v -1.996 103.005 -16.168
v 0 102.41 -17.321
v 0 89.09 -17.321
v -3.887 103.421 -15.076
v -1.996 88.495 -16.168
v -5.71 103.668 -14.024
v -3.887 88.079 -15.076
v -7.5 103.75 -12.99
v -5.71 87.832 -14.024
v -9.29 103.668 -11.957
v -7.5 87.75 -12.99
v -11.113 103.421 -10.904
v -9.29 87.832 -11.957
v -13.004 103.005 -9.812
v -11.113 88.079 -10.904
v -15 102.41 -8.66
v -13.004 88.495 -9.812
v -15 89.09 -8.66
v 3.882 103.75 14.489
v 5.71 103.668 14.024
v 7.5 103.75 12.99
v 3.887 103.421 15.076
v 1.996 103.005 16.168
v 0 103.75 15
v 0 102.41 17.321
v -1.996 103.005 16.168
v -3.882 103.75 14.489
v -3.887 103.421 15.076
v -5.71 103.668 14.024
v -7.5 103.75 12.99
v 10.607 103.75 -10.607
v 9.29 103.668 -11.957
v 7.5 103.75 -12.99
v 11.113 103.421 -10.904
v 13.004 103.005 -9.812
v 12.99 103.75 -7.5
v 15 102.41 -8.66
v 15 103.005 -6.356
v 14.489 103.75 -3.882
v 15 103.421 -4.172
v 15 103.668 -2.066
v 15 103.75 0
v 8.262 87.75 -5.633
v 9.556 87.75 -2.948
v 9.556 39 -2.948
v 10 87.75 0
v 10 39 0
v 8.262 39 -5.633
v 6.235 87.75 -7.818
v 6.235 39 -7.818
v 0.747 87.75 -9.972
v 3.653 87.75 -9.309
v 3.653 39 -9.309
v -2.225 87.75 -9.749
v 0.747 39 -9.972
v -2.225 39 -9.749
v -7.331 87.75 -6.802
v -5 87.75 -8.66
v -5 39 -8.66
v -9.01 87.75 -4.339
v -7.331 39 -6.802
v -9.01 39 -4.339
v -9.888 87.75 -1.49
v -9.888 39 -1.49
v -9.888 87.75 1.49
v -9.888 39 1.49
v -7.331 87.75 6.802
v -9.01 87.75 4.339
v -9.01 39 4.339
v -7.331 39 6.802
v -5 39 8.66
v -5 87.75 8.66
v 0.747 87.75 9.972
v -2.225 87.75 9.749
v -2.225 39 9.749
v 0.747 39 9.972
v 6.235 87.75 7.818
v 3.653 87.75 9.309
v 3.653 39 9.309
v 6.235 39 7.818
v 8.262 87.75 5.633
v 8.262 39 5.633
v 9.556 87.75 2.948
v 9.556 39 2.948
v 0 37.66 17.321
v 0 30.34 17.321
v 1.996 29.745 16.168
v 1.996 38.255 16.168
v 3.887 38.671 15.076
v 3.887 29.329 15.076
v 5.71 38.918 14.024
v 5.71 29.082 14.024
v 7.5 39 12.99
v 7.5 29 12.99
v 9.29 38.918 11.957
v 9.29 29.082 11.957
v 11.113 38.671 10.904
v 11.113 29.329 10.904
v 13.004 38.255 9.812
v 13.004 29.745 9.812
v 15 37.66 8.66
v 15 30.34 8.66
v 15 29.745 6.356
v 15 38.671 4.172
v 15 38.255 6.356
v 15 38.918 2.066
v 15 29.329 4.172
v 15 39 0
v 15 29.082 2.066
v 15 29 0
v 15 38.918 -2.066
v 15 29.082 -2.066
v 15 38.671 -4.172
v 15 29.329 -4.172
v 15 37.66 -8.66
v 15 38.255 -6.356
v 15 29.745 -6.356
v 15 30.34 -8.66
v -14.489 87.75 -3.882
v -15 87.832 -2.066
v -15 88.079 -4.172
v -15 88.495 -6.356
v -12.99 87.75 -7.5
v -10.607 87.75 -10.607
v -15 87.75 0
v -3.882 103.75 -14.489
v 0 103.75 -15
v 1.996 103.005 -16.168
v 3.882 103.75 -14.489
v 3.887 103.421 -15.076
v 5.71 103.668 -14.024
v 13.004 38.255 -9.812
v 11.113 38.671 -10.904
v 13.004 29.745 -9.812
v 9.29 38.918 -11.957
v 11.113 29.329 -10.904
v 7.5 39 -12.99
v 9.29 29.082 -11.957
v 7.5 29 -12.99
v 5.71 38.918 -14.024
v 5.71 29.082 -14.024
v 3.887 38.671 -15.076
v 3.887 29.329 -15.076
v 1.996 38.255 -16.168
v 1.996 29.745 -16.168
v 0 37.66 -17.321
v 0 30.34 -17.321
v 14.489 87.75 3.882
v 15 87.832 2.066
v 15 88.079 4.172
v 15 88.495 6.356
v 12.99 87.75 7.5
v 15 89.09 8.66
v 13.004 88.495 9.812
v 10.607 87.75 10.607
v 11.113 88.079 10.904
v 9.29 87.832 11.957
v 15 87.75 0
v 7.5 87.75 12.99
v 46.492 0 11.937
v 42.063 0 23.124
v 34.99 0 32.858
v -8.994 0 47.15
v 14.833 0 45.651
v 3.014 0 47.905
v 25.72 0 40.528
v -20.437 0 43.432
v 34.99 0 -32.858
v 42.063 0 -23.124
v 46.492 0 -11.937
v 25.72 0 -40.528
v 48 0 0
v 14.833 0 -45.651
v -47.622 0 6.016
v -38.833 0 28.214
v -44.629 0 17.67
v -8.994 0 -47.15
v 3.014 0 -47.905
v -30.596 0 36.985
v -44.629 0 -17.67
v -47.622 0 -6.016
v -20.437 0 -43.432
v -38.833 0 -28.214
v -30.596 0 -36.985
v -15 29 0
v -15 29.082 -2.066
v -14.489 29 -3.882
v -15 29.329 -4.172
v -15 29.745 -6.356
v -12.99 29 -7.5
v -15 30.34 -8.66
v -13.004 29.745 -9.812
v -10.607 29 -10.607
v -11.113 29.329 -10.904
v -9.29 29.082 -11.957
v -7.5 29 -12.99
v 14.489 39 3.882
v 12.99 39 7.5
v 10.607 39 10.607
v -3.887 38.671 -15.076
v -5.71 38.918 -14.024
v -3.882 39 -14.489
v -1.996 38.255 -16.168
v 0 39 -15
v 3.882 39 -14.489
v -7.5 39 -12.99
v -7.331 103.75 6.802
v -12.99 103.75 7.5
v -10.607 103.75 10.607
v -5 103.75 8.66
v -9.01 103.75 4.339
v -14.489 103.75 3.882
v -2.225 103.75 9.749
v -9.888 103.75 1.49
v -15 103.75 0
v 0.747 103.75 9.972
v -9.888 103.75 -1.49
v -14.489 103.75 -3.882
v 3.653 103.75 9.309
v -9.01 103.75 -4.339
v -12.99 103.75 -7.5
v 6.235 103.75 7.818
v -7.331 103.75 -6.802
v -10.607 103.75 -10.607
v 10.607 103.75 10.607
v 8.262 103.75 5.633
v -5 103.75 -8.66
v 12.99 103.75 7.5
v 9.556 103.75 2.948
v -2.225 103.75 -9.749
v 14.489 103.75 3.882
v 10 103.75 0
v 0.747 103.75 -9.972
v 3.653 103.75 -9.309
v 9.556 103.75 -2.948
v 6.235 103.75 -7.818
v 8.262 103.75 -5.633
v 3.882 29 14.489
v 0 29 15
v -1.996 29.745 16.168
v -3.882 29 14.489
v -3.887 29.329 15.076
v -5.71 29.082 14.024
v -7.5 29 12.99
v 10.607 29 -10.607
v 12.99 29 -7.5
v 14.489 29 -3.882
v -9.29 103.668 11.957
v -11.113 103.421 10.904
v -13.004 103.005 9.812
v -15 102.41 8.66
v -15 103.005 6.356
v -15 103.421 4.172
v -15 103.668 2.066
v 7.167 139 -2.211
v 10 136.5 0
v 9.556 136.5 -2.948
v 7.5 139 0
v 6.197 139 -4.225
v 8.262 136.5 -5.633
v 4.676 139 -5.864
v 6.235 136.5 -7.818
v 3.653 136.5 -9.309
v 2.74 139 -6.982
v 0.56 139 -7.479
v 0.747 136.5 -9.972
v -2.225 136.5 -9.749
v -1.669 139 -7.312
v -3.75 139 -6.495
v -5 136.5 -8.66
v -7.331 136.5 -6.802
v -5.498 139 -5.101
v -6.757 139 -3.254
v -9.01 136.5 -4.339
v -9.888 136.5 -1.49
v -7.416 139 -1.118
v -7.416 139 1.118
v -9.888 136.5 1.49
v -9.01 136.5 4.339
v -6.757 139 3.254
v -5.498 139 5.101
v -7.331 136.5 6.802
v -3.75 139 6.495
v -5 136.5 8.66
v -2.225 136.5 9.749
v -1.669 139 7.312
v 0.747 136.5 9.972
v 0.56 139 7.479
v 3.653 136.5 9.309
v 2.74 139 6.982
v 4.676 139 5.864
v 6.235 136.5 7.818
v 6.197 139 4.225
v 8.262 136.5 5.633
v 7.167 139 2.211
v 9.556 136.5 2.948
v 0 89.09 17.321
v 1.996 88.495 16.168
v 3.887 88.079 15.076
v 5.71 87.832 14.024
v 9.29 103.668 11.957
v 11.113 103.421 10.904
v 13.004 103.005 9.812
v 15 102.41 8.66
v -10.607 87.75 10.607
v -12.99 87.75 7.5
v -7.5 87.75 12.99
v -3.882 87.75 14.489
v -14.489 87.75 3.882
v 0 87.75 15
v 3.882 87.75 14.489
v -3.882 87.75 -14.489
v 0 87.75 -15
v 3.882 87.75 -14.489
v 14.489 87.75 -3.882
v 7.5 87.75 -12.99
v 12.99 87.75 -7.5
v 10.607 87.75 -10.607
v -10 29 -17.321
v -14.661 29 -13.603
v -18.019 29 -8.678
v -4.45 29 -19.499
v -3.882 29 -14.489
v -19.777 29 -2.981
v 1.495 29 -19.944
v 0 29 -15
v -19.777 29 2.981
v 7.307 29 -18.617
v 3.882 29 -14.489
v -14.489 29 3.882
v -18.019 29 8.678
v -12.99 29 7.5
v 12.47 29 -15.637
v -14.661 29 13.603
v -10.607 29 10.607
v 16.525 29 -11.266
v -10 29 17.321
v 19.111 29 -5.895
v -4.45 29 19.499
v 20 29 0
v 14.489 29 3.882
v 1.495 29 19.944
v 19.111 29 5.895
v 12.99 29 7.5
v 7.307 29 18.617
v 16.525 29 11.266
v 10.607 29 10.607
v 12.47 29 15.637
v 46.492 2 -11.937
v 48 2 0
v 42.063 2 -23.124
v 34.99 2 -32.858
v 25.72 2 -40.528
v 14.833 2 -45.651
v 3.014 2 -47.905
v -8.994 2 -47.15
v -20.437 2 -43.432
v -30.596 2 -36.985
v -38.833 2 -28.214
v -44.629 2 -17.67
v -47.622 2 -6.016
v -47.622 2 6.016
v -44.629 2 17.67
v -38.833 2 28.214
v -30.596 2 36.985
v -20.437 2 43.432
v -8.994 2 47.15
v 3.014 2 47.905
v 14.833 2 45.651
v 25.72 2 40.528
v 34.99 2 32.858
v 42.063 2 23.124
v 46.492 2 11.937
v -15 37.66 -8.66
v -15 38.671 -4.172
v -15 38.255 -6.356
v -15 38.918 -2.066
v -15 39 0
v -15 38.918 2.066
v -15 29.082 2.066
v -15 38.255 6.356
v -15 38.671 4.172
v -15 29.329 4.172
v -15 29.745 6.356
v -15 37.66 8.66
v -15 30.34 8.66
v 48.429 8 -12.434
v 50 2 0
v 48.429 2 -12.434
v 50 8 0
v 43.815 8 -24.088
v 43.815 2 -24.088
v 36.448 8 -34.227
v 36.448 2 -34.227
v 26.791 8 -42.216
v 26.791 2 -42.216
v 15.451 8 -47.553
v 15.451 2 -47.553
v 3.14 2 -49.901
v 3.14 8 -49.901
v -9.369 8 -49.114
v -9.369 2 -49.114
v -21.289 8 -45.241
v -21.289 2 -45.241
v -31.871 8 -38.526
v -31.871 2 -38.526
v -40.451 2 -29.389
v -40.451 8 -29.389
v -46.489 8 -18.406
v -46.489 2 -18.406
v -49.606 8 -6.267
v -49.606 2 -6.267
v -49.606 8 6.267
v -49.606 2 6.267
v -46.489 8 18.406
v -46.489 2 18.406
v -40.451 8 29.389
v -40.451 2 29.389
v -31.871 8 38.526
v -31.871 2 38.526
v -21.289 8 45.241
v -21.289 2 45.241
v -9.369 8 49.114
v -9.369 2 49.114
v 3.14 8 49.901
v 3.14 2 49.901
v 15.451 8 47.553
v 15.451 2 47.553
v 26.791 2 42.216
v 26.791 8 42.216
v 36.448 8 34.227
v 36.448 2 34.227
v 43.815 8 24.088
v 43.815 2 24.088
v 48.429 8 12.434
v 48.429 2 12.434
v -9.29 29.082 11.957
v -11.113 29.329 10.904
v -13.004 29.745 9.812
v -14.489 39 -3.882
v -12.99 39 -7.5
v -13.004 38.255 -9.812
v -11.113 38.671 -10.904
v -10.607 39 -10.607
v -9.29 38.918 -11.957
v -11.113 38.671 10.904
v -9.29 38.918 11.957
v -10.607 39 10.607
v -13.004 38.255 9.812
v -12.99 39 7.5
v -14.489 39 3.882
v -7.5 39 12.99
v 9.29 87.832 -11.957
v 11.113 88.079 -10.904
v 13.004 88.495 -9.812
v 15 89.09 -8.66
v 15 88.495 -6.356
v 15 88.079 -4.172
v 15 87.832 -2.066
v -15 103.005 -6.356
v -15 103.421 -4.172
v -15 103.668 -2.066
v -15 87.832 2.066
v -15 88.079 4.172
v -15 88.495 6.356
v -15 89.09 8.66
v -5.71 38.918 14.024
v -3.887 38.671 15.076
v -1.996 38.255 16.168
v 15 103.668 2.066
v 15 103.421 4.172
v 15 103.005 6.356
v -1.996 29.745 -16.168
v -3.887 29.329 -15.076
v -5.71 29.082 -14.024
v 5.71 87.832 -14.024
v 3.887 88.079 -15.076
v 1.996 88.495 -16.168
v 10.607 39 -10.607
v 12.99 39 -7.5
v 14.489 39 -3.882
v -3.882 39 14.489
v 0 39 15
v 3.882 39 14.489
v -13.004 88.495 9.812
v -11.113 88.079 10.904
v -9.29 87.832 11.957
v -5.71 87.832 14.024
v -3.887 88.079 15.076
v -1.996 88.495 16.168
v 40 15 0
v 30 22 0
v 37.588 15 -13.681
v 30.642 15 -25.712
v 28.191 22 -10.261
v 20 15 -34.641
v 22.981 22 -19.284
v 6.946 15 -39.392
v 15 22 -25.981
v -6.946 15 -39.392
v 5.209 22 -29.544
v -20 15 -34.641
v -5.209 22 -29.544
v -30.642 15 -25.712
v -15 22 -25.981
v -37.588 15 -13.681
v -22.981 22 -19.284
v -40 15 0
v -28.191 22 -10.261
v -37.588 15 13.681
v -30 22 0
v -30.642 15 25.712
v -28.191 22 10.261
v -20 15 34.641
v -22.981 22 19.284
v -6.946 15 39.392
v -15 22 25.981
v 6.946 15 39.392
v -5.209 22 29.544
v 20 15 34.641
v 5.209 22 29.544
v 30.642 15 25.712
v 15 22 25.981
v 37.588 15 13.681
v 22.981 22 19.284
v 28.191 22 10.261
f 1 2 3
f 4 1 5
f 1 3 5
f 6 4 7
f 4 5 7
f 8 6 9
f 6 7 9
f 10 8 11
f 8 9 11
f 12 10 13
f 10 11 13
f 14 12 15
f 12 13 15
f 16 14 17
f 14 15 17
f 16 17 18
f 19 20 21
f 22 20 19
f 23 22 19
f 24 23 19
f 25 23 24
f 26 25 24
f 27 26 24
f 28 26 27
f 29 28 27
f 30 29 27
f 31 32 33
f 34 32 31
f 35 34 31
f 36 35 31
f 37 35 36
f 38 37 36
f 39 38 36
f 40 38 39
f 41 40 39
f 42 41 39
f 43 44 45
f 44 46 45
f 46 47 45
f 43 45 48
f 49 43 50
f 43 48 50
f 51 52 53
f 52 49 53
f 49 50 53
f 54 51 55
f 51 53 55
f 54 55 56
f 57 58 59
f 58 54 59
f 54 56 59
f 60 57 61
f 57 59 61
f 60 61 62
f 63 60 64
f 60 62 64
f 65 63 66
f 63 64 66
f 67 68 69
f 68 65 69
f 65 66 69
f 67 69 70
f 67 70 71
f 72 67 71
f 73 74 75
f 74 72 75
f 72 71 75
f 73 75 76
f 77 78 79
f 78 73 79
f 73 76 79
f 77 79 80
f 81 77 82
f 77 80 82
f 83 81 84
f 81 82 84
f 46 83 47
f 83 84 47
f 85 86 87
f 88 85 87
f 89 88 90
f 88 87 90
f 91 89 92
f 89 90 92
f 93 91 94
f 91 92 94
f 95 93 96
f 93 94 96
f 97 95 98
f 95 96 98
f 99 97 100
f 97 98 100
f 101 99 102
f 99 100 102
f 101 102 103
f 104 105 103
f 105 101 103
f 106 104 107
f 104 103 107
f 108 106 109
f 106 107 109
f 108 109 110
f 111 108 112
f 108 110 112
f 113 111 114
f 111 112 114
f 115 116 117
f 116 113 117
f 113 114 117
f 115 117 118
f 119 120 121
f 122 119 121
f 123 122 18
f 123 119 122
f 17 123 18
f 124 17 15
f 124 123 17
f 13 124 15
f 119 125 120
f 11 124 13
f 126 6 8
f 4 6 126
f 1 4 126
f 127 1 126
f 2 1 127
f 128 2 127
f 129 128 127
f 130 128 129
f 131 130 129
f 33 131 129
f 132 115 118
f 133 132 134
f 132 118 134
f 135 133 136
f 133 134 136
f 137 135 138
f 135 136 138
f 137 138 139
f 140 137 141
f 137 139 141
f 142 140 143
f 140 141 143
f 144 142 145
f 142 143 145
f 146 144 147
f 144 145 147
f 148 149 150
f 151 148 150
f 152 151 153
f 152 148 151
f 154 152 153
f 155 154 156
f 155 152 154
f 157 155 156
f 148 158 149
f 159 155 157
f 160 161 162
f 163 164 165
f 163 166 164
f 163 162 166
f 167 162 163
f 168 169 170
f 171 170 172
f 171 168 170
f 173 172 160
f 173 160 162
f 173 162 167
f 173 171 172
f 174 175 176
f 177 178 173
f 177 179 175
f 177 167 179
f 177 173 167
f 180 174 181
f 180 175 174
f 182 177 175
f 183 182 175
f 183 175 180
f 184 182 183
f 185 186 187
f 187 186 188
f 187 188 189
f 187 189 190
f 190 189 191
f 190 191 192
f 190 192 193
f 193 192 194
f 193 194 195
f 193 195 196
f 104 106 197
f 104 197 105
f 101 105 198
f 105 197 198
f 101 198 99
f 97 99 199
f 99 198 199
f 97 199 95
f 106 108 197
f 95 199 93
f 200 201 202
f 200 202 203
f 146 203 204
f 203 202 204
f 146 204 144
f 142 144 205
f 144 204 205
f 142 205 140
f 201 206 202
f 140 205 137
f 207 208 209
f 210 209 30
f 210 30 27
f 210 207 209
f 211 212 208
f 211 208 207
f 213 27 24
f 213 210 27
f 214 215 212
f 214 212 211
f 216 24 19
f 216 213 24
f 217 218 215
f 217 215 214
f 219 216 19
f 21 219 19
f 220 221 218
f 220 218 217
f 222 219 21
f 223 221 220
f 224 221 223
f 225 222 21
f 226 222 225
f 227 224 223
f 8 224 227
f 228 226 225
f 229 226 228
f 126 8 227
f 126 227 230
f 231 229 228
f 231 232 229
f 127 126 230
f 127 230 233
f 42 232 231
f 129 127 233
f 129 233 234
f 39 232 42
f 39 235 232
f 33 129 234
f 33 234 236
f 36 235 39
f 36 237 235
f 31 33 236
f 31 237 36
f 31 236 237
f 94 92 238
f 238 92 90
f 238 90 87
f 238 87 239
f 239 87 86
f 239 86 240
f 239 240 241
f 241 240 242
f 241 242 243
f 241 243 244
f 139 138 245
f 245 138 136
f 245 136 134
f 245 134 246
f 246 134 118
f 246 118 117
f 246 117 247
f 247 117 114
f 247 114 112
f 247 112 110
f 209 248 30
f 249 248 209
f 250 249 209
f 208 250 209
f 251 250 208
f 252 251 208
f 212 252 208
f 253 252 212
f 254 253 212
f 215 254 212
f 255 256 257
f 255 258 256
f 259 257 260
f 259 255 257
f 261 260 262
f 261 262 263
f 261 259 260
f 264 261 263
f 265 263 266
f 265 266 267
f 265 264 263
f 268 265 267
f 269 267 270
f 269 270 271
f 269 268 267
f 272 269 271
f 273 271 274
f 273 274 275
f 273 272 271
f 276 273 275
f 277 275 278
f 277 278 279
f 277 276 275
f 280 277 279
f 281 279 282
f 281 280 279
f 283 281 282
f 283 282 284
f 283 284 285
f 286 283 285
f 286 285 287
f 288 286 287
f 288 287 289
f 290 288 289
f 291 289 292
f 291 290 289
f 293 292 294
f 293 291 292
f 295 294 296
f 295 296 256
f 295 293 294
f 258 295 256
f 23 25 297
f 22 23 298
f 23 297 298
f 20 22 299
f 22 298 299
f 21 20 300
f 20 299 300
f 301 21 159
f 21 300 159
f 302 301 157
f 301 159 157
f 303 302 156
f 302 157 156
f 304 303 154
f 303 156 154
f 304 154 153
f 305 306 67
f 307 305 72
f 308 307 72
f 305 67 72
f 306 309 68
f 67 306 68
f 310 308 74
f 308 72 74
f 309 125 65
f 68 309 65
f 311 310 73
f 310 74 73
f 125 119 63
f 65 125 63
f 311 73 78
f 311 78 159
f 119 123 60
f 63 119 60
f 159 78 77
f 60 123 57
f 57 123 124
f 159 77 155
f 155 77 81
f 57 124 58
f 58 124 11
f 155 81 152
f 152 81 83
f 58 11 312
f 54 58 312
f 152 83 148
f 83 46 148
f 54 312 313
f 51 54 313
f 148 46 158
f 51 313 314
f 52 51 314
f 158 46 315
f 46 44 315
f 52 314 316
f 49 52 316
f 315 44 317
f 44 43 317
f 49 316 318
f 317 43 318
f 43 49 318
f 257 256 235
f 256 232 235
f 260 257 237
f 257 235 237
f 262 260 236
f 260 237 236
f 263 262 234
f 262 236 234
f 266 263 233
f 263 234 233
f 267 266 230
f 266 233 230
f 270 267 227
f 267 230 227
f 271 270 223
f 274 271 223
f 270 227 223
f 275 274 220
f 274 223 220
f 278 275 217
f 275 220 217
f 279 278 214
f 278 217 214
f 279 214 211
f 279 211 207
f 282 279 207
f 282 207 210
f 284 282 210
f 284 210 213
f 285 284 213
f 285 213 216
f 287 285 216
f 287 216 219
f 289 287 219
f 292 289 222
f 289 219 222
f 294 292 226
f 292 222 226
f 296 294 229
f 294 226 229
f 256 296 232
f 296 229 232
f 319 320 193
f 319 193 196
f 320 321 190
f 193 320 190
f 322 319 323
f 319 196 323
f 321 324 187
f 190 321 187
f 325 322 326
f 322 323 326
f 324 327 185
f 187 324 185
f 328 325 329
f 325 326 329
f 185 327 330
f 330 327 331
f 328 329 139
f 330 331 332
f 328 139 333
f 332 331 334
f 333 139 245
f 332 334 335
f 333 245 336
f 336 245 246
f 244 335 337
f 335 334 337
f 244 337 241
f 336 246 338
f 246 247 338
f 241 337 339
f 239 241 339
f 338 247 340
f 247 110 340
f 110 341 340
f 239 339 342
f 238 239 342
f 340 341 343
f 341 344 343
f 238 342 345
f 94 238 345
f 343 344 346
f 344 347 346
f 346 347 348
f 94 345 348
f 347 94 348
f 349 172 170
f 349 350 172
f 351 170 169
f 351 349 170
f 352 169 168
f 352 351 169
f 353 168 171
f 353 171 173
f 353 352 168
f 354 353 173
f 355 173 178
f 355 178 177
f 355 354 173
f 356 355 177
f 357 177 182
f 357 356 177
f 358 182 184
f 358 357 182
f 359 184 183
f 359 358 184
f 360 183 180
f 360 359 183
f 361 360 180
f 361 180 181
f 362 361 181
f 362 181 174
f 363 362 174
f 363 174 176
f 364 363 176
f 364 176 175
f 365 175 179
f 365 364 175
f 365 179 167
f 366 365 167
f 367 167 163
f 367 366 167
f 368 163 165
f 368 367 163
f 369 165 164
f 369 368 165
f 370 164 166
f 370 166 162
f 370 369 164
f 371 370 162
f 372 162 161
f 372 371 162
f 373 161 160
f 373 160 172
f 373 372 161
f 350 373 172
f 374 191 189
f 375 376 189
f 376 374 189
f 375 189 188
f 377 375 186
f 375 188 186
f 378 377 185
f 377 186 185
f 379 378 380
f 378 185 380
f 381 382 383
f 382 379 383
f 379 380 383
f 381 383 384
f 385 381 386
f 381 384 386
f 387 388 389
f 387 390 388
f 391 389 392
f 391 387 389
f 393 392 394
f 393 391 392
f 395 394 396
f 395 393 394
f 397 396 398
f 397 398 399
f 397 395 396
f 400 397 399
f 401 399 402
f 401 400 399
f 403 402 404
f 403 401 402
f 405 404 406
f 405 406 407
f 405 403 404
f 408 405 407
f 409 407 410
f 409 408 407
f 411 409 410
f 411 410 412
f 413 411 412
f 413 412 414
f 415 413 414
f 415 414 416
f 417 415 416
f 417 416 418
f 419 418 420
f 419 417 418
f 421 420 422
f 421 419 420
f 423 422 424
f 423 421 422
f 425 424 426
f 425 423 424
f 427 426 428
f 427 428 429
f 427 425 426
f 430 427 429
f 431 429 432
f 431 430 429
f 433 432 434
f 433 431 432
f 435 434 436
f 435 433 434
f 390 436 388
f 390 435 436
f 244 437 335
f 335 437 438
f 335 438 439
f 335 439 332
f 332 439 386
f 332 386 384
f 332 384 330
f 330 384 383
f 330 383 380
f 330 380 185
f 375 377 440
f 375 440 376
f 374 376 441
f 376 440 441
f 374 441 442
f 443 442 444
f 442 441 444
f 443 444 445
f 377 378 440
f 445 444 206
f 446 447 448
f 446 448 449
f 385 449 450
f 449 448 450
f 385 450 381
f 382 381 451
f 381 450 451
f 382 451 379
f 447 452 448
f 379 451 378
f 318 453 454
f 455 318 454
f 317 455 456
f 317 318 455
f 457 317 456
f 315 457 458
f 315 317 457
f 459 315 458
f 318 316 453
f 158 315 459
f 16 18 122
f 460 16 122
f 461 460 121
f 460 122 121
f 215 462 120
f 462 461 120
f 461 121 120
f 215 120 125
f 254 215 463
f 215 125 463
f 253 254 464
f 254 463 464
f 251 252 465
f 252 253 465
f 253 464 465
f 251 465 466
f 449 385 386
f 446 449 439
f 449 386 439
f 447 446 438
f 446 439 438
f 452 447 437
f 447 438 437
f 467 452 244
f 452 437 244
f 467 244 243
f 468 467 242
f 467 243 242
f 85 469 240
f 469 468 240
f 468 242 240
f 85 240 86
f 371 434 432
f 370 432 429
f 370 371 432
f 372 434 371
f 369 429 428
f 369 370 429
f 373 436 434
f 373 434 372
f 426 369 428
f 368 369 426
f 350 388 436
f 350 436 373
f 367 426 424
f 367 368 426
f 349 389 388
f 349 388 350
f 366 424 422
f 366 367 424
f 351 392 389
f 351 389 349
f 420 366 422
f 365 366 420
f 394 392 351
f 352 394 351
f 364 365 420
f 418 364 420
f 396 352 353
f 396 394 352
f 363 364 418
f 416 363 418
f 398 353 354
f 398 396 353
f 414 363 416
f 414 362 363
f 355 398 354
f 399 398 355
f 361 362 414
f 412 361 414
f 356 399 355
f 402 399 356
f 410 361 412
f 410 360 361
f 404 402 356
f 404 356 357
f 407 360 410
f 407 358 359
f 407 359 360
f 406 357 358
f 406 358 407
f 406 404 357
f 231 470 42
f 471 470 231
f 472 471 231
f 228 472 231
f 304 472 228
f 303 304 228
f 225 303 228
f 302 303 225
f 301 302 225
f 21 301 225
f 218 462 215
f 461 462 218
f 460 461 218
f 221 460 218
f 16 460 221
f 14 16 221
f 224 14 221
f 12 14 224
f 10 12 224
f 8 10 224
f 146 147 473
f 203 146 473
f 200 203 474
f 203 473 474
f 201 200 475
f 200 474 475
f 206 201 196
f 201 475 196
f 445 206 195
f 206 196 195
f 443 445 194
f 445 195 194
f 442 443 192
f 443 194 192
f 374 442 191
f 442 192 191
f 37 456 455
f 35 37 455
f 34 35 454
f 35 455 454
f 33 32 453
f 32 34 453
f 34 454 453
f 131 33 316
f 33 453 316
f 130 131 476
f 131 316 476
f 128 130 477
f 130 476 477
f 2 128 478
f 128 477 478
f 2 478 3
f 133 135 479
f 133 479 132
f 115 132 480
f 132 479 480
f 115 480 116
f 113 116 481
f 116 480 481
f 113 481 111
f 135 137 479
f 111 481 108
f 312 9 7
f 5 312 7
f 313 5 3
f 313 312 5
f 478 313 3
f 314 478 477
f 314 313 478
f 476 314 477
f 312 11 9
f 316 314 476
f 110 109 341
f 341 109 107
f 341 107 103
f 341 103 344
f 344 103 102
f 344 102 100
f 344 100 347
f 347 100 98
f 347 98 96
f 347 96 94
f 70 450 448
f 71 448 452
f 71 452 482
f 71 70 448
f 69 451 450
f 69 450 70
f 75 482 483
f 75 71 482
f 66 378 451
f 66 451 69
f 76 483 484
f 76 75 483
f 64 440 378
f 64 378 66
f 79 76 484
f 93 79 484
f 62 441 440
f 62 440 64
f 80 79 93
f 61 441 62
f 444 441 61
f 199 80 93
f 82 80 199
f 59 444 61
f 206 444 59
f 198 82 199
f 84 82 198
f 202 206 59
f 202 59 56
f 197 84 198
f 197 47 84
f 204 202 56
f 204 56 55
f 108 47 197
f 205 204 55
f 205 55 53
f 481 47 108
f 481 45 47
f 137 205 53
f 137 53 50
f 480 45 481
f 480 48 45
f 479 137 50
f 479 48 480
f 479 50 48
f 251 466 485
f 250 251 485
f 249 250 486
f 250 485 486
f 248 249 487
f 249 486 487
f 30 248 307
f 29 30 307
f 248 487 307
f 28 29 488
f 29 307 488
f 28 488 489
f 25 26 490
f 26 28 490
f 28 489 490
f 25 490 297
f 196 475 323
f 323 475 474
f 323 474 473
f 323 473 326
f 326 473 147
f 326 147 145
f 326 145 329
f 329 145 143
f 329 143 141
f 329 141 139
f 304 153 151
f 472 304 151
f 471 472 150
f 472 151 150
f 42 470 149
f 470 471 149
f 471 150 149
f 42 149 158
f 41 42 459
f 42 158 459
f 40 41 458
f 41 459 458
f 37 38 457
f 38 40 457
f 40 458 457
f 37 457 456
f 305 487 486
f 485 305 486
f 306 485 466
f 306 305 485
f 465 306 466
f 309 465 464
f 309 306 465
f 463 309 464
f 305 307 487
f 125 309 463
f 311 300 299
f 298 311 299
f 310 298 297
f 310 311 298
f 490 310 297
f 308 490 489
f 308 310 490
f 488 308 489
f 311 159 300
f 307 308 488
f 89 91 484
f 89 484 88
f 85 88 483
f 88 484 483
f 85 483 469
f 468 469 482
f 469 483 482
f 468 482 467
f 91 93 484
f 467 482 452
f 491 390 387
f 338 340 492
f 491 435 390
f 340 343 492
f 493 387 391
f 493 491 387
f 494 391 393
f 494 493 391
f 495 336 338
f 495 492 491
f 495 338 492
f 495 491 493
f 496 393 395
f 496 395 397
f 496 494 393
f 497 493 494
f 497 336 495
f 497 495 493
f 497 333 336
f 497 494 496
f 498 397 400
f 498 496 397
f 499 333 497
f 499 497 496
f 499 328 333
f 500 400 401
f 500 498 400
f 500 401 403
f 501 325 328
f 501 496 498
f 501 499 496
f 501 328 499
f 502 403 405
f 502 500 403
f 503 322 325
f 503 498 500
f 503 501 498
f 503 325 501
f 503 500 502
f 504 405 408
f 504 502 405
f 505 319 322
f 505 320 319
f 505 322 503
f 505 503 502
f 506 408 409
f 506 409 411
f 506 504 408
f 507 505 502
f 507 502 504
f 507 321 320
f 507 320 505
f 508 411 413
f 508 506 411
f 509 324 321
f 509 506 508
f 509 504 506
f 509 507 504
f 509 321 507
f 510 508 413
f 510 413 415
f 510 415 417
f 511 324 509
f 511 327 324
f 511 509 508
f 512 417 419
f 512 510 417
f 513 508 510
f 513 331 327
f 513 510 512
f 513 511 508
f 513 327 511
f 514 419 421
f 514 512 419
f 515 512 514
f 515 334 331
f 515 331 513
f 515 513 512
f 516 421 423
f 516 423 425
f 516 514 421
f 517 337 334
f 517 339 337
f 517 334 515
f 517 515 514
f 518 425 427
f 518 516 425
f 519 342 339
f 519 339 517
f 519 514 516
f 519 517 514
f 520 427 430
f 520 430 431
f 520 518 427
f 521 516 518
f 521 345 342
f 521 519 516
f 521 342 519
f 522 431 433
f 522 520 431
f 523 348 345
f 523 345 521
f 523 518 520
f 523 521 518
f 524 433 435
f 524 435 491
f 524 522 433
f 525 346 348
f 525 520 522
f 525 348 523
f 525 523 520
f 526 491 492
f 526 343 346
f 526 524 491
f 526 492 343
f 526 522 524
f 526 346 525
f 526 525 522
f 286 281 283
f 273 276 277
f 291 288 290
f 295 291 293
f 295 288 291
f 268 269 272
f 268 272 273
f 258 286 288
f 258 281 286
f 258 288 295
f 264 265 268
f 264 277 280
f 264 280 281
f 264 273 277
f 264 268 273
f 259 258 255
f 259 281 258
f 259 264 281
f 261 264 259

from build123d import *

# Parameters (mm, degrees)
EXTRUDE_1_DEPTH = 10
EXTRUDE_2_DEPTH = 16


with BuildPart() as part:
    # Эскиз1 → Повернуть1 (revolve)
    with BuildSketch(Plane.XY, mode=Mode.PRIVATE) as revolve_1_sk:
        Polygon((0, 0), (-48, 0), (-48, 2), (-50, 2), (-50, 8), (-20, 29), (-10, 29), (-10, 39), (-10, 136.5), (-7.5, 139), (0, 139), align=None)
    revolve(revolve_1_sk.sketch.rotate(Axis((0, 0, 0), (0, 1, 0)), 180), axis=Axis((0, 0, 0), (0, 1, 0)))  # turned: the seam where the file's is

    # Эскиз2 → Бобышка-Вытянуть1 (add)
    with BuildSketch(Plane(origin=(0, 29, 0), x_dir=(1, 0, 0), z_dir=(0, 1, 0))):
        Polygon((0, 17.320508076), (-15, 8.660254038), (-15, -8.660254038), (0, -17.320508076), (15, -8.660254038), (15, 8.660254038), align=None)
    extrude(amount=EXTRUDE_1_DEPTH)

    # Эскиз3 → Бобышка-Вытянуть2 (add)
    with BuildSketch(Plane(origin=(0, 87.75, 0), x_dir=(1, 0, 0), z_dir=(0, 1, 0))):
        Polygon((15, 8.660254038), (0, 17.320508076), (-15, 8.660254038), (-15, -8.660254038), (0, -17.320508076), (15, -8.660254038), align=None)
    extrude(amount=EXTRUDE_2_DEPTH)

    # Эскиз4 → Вырез-Повернуть2 (revolve, cut)
    with BuildSketch(Plane.XY, mode=Mode.PRIVATE) as cut_revolve_2_sk:
        Polygon((-28.856406461, 103.75), (-15, 103.75), (-28.856406461, 95.75), align=None)
        Polygon((-28.856406461, 87.75), (-28.856406461, 95.75), (-15, 87.75), align=None)
        Polygon((-23.660254038, 39), (-23.660254038, 34), (-15, 39), align=None)
        Polygon((-23.660254038, 34), (-23.660254038, 29), (-15, 29), align=None)
    revolve(cut_revolve_2_sk.sketch.rotate(Axis((0, 139, 0), (0, -1, 0)), 180), axis=Axis((0, 139, 0), (0, -1, 0)), mode=Mode.SUBTRACT)  # turned: the seam where the file's is


solid = part.part
